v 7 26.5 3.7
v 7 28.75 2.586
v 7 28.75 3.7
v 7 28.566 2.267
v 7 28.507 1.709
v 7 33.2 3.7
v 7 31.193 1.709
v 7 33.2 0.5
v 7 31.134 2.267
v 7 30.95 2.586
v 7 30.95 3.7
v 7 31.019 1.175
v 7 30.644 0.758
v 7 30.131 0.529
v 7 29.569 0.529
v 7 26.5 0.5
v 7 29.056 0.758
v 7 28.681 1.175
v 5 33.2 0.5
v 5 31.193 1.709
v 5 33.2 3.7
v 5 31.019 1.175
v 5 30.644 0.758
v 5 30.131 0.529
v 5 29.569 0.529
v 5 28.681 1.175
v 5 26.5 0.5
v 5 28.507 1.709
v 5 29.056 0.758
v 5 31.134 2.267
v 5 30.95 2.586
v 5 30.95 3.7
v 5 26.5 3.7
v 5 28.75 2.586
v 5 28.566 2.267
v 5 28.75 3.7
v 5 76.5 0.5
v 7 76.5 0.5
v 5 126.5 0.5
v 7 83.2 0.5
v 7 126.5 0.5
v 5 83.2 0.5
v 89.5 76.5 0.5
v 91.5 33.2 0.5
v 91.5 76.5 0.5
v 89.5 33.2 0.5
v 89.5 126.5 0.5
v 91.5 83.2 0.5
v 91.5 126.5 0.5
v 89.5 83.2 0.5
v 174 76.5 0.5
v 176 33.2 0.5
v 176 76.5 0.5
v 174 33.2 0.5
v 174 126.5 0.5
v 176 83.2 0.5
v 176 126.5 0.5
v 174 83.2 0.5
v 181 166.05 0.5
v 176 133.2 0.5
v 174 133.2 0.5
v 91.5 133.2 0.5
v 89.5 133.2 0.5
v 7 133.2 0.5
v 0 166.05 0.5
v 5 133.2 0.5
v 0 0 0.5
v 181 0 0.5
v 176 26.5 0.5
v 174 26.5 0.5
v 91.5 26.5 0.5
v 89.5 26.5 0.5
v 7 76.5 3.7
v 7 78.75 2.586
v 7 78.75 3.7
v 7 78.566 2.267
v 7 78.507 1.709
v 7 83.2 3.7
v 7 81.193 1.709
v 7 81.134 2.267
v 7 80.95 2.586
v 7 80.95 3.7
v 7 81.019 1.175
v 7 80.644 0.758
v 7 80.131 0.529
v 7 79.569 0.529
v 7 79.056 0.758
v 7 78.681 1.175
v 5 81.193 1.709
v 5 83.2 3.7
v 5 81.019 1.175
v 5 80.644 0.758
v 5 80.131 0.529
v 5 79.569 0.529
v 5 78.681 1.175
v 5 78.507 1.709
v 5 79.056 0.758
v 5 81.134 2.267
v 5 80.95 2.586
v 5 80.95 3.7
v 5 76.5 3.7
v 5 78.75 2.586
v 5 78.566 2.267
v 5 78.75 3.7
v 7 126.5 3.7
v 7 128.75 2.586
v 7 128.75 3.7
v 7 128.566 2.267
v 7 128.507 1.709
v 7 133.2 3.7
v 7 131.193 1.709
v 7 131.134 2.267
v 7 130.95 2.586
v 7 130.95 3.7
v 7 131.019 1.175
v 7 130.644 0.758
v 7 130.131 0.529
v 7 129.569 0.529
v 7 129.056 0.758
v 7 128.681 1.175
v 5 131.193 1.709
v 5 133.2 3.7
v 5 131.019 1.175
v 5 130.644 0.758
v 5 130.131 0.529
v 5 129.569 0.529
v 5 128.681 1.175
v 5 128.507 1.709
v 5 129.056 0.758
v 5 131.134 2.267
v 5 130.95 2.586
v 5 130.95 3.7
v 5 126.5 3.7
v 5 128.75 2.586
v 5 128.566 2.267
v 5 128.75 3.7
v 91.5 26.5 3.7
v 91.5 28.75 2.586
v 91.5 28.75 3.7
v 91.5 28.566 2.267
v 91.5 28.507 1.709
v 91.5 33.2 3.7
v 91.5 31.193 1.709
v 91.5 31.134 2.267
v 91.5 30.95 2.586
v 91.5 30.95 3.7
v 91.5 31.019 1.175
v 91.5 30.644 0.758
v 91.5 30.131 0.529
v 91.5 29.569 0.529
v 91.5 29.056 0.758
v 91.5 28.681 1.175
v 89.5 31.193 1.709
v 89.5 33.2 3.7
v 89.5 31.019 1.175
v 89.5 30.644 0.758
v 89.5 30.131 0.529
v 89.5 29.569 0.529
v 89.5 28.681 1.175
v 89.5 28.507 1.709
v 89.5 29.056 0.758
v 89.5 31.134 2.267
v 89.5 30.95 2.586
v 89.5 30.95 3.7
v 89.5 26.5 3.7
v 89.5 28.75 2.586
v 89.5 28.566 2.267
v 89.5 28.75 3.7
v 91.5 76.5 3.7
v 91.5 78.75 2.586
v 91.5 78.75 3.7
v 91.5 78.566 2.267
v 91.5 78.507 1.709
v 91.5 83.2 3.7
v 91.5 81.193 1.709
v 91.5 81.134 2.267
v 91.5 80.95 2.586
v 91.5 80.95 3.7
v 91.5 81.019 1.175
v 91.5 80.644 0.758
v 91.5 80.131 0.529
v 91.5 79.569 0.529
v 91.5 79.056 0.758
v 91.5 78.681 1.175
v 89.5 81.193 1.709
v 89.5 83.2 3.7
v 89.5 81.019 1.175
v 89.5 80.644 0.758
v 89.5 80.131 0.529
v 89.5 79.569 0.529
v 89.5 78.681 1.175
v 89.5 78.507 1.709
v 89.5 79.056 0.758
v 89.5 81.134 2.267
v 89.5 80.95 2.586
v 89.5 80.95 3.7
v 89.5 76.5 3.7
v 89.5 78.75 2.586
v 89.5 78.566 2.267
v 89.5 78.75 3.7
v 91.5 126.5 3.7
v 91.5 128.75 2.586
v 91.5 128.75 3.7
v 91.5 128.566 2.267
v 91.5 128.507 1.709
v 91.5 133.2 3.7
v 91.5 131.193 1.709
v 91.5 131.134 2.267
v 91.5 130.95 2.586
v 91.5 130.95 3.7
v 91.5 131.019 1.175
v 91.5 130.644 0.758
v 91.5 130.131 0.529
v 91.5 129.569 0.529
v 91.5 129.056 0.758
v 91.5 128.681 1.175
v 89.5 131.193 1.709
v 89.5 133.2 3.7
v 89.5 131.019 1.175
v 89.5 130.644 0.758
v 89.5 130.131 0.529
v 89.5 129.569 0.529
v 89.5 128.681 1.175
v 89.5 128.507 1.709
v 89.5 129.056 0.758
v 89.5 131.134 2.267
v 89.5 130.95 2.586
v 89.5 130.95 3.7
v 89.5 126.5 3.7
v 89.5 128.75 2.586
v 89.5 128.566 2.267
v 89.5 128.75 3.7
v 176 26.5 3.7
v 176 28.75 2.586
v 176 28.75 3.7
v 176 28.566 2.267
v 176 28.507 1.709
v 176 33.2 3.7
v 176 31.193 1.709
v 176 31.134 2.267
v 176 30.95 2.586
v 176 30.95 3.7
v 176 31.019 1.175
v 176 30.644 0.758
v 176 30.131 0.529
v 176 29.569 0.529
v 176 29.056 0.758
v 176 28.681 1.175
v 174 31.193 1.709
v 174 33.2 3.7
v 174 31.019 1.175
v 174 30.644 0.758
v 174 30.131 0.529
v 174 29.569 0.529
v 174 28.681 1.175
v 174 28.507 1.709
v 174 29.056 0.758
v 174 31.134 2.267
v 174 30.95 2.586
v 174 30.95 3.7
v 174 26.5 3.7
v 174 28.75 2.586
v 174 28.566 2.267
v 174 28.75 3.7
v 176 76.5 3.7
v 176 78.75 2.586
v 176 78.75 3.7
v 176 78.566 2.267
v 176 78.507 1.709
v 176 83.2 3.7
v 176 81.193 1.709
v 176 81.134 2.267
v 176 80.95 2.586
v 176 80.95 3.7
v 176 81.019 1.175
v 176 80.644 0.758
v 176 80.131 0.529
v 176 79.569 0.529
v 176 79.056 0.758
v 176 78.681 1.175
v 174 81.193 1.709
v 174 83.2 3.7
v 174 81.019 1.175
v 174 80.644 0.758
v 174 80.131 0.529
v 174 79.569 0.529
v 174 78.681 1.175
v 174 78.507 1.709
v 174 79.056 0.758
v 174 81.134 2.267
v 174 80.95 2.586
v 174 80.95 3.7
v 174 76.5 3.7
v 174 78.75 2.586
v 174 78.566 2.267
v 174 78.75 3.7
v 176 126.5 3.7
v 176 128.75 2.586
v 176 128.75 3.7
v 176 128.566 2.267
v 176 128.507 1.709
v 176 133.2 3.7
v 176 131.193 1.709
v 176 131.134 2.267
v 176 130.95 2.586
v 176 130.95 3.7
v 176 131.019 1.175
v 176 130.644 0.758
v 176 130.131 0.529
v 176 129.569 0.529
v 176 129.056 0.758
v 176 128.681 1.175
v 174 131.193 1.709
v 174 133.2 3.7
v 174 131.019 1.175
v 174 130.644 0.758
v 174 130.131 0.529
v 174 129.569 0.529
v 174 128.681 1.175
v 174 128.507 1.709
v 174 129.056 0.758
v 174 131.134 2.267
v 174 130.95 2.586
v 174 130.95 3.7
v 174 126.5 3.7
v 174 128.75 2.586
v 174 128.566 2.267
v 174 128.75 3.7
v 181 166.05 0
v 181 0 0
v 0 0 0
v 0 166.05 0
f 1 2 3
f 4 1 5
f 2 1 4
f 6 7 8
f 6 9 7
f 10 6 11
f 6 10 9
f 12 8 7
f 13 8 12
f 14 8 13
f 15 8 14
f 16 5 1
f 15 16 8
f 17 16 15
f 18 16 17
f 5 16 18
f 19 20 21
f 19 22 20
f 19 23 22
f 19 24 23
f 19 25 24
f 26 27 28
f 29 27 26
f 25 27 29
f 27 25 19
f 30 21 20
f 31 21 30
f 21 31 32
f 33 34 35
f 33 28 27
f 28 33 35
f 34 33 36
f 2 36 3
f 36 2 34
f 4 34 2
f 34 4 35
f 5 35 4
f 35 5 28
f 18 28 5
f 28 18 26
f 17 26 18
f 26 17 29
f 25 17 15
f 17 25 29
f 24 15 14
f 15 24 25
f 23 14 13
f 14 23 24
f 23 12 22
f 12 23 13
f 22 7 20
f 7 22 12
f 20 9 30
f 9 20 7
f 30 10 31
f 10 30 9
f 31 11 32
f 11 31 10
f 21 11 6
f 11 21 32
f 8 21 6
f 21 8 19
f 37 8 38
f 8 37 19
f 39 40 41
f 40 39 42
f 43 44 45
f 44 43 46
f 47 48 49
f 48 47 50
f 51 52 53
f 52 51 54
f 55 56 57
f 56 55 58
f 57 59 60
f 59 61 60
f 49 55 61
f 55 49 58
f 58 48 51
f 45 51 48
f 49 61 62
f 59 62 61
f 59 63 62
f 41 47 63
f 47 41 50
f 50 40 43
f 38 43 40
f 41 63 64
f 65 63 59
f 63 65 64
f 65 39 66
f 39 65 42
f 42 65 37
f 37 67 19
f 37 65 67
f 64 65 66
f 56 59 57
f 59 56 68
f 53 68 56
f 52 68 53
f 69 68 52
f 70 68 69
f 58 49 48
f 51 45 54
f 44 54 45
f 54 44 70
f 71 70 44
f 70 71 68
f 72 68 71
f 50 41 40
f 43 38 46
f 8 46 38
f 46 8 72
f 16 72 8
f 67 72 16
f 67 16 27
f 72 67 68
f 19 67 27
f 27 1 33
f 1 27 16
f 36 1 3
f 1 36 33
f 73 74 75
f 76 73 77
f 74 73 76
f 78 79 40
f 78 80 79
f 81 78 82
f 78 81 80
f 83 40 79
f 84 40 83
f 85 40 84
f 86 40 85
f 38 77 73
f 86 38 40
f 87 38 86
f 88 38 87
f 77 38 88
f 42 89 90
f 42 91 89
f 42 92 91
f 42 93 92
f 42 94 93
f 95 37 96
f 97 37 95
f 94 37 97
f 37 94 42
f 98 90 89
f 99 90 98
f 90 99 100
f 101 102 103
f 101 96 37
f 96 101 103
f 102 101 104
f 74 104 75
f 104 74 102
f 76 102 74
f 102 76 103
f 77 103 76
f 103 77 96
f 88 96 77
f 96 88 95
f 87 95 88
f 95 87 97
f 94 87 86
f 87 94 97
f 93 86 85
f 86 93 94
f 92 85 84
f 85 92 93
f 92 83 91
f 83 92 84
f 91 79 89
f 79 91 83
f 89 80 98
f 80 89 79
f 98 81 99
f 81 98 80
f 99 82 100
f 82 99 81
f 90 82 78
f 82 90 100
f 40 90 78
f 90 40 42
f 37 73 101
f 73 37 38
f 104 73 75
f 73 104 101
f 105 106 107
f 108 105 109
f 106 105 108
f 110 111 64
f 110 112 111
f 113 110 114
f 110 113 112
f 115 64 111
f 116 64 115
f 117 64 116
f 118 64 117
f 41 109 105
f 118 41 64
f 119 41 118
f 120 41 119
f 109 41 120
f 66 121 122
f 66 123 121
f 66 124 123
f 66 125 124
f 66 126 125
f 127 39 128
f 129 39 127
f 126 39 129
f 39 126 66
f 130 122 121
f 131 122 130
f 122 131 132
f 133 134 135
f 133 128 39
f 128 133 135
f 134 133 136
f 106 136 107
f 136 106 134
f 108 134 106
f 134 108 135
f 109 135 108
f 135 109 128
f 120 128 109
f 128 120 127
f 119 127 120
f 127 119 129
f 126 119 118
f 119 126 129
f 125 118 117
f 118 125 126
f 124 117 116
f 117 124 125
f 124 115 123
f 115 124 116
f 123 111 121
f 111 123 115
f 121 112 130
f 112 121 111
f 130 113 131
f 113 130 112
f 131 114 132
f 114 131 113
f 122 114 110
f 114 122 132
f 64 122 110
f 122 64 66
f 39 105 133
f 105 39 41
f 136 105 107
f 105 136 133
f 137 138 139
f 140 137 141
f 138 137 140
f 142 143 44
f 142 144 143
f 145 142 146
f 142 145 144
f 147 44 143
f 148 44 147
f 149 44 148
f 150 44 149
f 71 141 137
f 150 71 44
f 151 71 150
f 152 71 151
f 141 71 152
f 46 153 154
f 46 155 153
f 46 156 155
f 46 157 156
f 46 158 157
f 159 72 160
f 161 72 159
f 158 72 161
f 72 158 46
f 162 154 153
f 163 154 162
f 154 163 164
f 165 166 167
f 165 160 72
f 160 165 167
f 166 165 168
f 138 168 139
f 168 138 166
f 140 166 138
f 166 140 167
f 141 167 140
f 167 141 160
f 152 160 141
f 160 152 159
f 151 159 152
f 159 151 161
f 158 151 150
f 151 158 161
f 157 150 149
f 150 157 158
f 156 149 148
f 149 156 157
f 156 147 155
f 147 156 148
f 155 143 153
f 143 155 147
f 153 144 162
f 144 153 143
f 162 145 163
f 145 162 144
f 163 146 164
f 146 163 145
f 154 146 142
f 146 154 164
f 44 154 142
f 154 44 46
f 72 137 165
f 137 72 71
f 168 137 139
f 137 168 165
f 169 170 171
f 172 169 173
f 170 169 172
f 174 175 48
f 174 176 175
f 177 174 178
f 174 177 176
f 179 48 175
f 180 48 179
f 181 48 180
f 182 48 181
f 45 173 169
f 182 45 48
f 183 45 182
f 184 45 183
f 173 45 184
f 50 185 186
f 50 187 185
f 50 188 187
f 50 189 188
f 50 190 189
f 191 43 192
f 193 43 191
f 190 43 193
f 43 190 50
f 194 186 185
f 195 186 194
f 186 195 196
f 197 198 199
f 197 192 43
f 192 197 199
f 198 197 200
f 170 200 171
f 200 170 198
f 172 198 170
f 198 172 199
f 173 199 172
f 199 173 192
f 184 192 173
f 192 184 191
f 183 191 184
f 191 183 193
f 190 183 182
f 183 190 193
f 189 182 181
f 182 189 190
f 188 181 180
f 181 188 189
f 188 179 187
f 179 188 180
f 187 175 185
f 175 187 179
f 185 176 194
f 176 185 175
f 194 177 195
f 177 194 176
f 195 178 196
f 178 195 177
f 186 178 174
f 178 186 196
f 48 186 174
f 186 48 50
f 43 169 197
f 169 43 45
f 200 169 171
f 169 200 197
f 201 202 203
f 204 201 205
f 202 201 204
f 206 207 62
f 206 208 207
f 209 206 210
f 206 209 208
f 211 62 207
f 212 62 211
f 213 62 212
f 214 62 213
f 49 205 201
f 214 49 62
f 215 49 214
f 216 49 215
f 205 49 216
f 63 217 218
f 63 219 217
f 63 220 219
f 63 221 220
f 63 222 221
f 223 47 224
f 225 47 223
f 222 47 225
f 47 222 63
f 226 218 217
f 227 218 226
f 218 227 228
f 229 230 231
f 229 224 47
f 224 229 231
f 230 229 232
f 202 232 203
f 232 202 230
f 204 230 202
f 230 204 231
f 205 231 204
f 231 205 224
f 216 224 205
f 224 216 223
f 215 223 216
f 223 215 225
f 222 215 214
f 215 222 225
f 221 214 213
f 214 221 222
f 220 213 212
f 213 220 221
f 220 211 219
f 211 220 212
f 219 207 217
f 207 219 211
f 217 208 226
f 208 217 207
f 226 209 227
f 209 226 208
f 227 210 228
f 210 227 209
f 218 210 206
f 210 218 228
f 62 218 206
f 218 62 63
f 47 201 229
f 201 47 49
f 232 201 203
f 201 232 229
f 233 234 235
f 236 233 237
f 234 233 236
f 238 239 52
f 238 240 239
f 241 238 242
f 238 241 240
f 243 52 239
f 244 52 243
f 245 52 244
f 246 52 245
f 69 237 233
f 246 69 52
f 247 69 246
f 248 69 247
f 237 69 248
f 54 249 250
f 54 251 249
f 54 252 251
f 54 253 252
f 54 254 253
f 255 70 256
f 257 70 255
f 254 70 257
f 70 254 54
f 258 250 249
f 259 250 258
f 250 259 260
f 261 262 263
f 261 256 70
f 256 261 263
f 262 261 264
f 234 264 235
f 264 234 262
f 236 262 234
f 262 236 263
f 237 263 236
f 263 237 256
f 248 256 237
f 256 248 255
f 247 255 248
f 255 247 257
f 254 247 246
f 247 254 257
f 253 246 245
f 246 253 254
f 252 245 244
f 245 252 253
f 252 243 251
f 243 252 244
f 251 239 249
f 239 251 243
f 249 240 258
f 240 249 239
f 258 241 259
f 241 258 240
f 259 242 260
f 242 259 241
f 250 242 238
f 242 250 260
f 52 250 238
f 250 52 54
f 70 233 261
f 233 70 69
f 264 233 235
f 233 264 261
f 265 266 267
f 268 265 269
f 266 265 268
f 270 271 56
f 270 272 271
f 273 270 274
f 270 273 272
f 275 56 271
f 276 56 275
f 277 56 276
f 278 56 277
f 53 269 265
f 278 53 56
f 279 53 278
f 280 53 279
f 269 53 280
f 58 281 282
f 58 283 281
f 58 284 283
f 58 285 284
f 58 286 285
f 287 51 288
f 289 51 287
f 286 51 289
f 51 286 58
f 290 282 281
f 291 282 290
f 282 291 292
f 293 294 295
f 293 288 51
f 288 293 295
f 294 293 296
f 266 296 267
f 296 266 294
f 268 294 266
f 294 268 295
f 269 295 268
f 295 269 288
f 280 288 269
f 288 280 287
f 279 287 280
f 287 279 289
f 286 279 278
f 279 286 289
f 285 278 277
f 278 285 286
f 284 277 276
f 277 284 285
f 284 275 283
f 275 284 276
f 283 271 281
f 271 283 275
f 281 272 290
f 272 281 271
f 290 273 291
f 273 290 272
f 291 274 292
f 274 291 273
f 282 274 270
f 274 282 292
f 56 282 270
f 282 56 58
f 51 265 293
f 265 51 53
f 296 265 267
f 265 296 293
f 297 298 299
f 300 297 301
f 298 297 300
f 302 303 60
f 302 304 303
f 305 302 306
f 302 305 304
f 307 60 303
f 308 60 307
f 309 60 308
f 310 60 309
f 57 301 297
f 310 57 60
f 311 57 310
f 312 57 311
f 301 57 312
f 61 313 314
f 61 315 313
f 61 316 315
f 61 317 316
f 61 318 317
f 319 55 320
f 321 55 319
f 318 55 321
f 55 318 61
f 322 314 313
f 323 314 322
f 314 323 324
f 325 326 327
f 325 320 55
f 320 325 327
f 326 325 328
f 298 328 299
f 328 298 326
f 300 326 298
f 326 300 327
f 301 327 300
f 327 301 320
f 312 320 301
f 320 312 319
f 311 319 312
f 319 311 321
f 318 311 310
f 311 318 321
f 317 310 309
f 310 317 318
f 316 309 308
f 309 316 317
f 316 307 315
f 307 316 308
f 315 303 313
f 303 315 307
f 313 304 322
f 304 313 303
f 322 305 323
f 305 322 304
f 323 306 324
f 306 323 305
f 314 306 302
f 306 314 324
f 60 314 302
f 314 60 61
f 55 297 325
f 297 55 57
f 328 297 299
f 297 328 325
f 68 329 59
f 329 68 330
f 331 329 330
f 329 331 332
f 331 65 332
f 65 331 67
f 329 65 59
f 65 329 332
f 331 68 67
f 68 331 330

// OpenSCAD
// Surface for a wire rack

wire_diameter = 2.7;
clip_width = 2;
clip_padding = 5;
platform_width = 181;
platform_height = 0.5;
clip_offset = 26.5; // center of first clip from end
pole_size = 26;
spacing = 50;

clip_outside = 4;
clip_size = wire_diameter + clip_outside;

module clip(pos) {
    color("blue")
    translate(pos)
    translate([clip_width, 0, 0])
    rotate([0, -90, 0])
    linear_extrude(clip_width) {
        difference() {
            square([wire_diameter + .5, clip_size]);
            
            translate([(wire_diameter) / 2, clip_size/2, 0])
            circle(wire_diameter / 2, $fn=15);
            
            translate([1 + (wire_diameter + 2) / 2, clip_size/2, 0])
            square([4, wire_diameter - .5], center = true);
        }
    }
}

union() {
    platform_depth = clip_offset + spacing + spacing + clip_size + (spacing/2-clip_size/2) + 22.4/2;
    echo(platform_depth = platform_depth);
    cube([platform_width, platform_depth, platform_height]);

    for (x = [clip_padding, platform_width/2 - clip_width/2, platform_width - clip_padding - clip_width]) {
        for (y = [0:2]) {
            clip([x, clip_offset + spacing * y, platform_height]);
        }
    }
}
